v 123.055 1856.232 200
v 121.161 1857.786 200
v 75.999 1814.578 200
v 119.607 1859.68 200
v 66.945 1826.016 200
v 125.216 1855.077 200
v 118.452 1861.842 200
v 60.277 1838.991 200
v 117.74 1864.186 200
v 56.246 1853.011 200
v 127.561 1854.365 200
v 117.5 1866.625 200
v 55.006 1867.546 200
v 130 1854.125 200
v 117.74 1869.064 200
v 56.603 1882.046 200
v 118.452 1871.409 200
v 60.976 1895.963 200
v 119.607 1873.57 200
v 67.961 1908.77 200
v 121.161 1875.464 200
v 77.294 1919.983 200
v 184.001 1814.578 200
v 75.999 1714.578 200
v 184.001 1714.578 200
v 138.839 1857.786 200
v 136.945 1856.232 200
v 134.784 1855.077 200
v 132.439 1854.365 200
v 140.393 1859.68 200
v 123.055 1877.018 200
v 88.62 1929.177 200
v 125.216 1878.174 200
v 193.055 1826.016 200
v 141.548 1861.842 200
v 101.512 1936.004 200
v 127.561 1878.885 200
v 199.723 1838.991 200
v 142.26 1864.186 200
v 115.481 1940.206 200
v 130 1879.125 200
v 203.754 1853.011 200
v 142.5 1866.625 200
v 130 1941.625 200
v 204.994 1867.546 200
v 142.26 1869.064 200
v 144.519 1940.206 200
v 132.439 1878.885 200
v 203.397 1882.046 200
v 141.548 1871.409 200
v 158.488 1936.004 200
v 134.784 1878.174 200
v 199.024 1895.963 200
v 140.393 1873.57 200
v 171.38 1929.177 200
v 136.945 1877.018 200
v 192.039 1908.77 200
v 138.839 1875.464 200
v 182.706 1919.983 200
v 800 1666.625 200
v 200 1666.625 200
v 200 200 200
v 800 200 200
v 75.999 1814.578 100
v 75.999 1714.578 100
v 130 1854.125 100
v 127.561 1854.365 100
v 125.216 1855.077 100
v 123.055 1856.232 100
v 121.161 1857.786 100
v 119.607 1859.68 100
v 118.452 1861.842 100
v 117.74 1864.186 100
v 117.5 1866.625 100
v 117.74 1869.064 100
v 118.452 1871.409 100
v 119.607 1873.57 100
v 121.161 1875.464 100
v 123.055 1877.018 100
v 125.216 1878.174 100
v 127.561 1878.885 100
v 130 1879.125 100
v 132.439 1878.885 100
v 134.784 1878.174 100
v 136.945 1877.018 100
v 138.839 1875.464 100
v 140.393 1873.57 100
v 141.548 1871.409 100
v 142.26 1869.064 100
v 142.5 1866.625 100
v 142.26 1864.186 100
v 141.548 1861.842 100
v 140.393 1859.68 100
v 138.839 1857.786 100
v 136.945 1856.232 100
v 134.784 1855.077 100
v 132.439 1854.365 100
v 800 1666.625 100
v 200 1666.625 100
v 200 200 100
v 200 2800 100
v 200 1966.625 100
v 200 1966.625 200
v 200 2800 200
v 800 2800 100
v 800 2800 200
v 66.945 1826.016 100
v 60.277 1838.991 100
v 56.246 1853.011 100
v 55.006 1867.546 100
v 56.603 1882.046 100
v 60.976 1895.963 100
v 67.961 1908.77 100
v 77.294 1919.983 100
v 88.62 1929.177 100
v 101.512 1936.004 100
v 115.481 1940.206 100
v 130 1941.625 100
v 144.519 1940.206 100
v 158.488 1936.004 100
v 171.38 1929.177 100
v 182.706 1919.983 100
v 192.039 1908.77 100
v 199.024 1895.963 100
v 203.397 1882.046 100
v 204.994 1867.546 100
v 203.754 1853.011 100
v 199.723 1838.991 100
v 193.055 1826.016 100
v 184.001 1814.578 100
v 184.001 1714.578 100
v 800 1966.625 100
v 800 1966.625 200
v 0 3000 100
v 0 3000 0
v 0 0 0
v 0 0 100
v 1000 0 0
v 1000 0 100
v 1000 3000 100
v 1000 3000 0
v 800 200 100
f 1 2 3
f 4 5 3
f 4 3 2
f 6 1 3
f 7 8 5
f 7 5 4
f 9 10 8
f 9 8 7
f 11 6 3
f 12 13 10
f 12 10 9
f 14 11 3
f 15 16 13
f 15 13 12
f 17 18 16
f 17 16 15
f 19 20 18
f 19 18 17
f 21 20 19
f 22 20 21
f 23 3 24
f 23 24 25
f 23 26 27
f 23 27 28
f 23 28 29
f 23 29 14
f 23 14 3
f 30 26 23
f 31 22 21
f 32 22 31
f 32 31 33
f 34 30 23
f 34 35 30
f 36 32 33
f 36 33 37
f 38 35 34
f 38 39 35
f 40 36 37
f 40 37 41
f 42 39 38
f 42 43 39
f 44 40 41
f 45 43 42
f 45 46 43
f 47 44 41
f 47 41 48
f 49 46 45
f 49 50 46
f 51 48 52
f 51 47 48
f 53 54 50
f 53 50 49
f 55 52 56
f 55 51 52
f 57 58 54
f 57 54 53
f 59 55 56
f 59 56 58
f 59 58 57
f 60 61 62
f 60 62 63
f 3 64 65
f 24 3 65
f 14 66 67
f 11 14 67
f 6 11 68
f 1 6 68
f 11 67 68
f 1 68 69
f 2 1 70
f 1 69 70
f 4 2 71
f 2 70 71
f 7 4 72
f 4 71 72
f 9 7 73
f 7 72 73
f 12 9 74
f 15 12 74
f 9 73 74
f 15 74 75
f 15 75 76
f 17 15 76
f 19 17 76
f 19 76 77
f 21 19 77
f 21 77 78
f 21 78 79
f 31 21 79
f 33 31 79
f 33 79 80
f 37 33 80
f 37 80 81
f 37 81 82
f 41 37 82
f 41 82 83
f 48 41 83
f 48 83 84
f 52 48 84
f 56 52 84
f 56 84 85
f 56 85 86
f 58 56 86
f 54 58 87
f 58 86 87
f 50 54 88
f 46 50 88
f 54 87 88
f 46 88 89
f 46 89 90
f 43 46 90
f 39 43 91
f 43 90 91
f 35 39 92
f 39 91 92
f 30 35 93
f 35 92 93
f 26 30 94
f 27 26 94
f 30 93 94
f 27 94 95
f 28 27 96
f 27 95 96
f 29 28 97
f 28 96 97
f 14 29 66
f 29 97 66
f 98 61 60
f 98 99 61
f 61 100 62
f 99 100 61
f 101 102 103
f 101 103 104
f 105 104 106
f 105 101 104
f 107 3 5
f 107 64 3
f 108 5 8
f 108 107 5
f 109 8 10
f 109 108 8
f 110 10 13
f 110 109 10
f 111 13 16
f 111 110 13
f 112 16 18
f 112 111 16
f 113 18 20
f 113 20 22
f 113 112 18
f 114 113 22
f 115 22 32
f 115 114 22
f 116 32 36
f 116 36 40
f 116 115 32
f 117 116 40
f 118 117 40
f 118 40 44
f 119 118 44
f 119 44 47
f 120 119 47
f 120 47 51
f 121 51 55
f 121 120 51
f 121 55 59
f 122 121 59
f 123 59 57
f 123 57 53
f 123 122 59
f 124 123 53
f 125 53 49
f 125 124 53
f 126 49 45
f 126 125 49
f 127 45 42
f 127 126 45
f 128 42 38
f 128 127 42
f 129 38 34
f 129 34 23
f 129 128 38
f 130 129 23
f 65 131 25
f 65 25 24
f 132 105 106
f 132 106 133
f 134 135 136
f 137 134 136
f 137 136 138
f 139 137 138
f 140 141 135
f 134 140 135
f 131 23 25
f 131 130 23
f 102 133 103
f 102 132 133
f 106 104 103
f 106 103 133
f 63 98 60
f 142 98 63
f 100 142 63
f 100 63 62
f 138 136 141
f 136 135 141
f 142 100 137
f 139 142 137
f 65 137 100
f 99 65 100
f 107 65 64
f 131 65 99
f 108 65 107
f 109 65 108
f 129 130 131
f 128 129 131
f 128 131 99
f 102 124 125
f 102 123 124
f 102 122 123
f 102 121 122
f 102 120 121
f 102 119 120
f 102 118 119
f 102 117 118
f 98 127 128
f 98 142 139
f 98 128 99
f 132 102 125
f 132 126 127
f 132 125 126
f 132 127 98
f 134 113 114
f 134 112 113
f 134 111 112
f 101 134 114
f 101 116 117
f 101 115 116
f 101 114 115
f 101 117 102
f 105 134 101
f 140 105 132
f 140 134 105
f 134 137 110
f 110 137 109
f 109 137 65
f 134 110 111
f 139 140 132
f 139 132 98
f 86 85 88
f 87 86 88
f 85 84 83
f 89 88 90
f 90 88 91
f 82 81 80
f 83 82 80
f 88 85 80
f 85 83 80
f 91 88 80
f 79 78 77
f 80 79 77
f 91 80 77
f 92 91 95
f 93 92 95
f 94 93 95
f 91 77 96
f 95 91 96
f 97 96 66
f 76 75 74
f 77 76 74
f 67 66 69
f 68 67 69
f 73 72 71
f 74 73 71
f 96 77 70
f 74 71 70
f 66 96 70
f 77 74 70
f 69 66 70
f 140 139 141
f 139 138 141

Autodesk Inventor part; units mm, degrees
ref_plane "YZ Plane" through (0, 0, 0) normal (1, 0, 0) x (0, 1, 0)
sketch "Sketch1" plane through (0, 0, 0) normal (0, 0, 1) x (1, 0, 0)
  line L0 (0, 0) -> (1000, 0)
  line L1 (1000, 0) -> (1000, 3000)
  line L2 (1000, 3000) -> (0, 3000)
  line L3 (0, 3000) -> (0, 0)
  dimension "d0" = 1000
  dimension "d1" = 3000
extrude "Extrusion1" add sketch "Sketch1" along normal blind 100
ref_plane "Work Plane1" through (0, 0, 100) normal (0, 0, 1) x (1, 0, 0)
sketch "Sketch2" plane through (0, 0, 100) normal (0, 0, 1) x (1, 0, 0)
  line L0 (200, 2800) -> (800, 2800)
  line L1 (800, 2800) -> (800, 1966.6251)
  line L2 (800, 1966.6251) -> (200, 1966.6251)
  line L3 (200, 1966.6251) -> (200, 2800)
  line L4 (200, 1666.6251) -> (800, 1666.6251)
  line L5 (800, 1666.6251) -> (800, 200)
  line L6 (800, 200) -> (200, 200)
  line L7 (200, 200) -> (200, 1666.6251)
  line L8 (1000, 3000) -> (0, 3000) projected
  line L9 (0, 3000) -> (0, 0) projected
  line L10 (1000, 0) -> (1000, 3000) projected
  line L11 (0, 0) -> (1000, 0) projected
  dimension "d5" = 200
  dimension "d6" = 200
  dimension "d7" = 200
  dimension "d8" = 300
  dimension "d9" = 200
extrude "Extrusion2" add sketch "Sketch2" along normal blind 100 contours L0 L1 L2 L3 | L4 L5 L6 L7
ref_plane "Work Plane2" through (0, 0, 100) normal (0, 0, 1) x (1, 0, 0)
sketch "Sketch3" plane through (0, 0, 100) normal (0, 0, 1) x (1, 0, 0)
  circle A0 centre (130, 1866.6251) radius 75
  line L0 (200, 2800) -> (200, 1966.6251) projected
  line L1 (200, 1966.6251) -> (800, 1966.6251) projected
  line L2 (75.9991, 1814.578) -> (75.9991, 1714.578)
  line L3 (184.0009, 1814.578) -> (184.0009, 1714.578)
  line L4 (184.0009, 1714.578) -> (75.9991, 1714.578)
  point P0 (0, 0)
  dimension "d13" = 150
  dimension "d14" = 70
  dimension "d15" = 100
  dimension "d16" = 100
  dimension "d17" = 100
extrude "Extrusion3" add sketch "Sketch3" along normal blind 100
sketch "Sketch4" plane through (0, 0, 200) normal (0, 0, 1) x (1, 0, 0)
  arc A0 (184.0009, 1814.578) -> (75.9991, 1814.578) centre (130, 1866.6251) ccw projected
  point P0 (0, 0)
hole "Hole1" at (130, 1866.6251, 200) direction (0, 0, -1) diameter 25 depth 100
properties part number "Maitri_door"
